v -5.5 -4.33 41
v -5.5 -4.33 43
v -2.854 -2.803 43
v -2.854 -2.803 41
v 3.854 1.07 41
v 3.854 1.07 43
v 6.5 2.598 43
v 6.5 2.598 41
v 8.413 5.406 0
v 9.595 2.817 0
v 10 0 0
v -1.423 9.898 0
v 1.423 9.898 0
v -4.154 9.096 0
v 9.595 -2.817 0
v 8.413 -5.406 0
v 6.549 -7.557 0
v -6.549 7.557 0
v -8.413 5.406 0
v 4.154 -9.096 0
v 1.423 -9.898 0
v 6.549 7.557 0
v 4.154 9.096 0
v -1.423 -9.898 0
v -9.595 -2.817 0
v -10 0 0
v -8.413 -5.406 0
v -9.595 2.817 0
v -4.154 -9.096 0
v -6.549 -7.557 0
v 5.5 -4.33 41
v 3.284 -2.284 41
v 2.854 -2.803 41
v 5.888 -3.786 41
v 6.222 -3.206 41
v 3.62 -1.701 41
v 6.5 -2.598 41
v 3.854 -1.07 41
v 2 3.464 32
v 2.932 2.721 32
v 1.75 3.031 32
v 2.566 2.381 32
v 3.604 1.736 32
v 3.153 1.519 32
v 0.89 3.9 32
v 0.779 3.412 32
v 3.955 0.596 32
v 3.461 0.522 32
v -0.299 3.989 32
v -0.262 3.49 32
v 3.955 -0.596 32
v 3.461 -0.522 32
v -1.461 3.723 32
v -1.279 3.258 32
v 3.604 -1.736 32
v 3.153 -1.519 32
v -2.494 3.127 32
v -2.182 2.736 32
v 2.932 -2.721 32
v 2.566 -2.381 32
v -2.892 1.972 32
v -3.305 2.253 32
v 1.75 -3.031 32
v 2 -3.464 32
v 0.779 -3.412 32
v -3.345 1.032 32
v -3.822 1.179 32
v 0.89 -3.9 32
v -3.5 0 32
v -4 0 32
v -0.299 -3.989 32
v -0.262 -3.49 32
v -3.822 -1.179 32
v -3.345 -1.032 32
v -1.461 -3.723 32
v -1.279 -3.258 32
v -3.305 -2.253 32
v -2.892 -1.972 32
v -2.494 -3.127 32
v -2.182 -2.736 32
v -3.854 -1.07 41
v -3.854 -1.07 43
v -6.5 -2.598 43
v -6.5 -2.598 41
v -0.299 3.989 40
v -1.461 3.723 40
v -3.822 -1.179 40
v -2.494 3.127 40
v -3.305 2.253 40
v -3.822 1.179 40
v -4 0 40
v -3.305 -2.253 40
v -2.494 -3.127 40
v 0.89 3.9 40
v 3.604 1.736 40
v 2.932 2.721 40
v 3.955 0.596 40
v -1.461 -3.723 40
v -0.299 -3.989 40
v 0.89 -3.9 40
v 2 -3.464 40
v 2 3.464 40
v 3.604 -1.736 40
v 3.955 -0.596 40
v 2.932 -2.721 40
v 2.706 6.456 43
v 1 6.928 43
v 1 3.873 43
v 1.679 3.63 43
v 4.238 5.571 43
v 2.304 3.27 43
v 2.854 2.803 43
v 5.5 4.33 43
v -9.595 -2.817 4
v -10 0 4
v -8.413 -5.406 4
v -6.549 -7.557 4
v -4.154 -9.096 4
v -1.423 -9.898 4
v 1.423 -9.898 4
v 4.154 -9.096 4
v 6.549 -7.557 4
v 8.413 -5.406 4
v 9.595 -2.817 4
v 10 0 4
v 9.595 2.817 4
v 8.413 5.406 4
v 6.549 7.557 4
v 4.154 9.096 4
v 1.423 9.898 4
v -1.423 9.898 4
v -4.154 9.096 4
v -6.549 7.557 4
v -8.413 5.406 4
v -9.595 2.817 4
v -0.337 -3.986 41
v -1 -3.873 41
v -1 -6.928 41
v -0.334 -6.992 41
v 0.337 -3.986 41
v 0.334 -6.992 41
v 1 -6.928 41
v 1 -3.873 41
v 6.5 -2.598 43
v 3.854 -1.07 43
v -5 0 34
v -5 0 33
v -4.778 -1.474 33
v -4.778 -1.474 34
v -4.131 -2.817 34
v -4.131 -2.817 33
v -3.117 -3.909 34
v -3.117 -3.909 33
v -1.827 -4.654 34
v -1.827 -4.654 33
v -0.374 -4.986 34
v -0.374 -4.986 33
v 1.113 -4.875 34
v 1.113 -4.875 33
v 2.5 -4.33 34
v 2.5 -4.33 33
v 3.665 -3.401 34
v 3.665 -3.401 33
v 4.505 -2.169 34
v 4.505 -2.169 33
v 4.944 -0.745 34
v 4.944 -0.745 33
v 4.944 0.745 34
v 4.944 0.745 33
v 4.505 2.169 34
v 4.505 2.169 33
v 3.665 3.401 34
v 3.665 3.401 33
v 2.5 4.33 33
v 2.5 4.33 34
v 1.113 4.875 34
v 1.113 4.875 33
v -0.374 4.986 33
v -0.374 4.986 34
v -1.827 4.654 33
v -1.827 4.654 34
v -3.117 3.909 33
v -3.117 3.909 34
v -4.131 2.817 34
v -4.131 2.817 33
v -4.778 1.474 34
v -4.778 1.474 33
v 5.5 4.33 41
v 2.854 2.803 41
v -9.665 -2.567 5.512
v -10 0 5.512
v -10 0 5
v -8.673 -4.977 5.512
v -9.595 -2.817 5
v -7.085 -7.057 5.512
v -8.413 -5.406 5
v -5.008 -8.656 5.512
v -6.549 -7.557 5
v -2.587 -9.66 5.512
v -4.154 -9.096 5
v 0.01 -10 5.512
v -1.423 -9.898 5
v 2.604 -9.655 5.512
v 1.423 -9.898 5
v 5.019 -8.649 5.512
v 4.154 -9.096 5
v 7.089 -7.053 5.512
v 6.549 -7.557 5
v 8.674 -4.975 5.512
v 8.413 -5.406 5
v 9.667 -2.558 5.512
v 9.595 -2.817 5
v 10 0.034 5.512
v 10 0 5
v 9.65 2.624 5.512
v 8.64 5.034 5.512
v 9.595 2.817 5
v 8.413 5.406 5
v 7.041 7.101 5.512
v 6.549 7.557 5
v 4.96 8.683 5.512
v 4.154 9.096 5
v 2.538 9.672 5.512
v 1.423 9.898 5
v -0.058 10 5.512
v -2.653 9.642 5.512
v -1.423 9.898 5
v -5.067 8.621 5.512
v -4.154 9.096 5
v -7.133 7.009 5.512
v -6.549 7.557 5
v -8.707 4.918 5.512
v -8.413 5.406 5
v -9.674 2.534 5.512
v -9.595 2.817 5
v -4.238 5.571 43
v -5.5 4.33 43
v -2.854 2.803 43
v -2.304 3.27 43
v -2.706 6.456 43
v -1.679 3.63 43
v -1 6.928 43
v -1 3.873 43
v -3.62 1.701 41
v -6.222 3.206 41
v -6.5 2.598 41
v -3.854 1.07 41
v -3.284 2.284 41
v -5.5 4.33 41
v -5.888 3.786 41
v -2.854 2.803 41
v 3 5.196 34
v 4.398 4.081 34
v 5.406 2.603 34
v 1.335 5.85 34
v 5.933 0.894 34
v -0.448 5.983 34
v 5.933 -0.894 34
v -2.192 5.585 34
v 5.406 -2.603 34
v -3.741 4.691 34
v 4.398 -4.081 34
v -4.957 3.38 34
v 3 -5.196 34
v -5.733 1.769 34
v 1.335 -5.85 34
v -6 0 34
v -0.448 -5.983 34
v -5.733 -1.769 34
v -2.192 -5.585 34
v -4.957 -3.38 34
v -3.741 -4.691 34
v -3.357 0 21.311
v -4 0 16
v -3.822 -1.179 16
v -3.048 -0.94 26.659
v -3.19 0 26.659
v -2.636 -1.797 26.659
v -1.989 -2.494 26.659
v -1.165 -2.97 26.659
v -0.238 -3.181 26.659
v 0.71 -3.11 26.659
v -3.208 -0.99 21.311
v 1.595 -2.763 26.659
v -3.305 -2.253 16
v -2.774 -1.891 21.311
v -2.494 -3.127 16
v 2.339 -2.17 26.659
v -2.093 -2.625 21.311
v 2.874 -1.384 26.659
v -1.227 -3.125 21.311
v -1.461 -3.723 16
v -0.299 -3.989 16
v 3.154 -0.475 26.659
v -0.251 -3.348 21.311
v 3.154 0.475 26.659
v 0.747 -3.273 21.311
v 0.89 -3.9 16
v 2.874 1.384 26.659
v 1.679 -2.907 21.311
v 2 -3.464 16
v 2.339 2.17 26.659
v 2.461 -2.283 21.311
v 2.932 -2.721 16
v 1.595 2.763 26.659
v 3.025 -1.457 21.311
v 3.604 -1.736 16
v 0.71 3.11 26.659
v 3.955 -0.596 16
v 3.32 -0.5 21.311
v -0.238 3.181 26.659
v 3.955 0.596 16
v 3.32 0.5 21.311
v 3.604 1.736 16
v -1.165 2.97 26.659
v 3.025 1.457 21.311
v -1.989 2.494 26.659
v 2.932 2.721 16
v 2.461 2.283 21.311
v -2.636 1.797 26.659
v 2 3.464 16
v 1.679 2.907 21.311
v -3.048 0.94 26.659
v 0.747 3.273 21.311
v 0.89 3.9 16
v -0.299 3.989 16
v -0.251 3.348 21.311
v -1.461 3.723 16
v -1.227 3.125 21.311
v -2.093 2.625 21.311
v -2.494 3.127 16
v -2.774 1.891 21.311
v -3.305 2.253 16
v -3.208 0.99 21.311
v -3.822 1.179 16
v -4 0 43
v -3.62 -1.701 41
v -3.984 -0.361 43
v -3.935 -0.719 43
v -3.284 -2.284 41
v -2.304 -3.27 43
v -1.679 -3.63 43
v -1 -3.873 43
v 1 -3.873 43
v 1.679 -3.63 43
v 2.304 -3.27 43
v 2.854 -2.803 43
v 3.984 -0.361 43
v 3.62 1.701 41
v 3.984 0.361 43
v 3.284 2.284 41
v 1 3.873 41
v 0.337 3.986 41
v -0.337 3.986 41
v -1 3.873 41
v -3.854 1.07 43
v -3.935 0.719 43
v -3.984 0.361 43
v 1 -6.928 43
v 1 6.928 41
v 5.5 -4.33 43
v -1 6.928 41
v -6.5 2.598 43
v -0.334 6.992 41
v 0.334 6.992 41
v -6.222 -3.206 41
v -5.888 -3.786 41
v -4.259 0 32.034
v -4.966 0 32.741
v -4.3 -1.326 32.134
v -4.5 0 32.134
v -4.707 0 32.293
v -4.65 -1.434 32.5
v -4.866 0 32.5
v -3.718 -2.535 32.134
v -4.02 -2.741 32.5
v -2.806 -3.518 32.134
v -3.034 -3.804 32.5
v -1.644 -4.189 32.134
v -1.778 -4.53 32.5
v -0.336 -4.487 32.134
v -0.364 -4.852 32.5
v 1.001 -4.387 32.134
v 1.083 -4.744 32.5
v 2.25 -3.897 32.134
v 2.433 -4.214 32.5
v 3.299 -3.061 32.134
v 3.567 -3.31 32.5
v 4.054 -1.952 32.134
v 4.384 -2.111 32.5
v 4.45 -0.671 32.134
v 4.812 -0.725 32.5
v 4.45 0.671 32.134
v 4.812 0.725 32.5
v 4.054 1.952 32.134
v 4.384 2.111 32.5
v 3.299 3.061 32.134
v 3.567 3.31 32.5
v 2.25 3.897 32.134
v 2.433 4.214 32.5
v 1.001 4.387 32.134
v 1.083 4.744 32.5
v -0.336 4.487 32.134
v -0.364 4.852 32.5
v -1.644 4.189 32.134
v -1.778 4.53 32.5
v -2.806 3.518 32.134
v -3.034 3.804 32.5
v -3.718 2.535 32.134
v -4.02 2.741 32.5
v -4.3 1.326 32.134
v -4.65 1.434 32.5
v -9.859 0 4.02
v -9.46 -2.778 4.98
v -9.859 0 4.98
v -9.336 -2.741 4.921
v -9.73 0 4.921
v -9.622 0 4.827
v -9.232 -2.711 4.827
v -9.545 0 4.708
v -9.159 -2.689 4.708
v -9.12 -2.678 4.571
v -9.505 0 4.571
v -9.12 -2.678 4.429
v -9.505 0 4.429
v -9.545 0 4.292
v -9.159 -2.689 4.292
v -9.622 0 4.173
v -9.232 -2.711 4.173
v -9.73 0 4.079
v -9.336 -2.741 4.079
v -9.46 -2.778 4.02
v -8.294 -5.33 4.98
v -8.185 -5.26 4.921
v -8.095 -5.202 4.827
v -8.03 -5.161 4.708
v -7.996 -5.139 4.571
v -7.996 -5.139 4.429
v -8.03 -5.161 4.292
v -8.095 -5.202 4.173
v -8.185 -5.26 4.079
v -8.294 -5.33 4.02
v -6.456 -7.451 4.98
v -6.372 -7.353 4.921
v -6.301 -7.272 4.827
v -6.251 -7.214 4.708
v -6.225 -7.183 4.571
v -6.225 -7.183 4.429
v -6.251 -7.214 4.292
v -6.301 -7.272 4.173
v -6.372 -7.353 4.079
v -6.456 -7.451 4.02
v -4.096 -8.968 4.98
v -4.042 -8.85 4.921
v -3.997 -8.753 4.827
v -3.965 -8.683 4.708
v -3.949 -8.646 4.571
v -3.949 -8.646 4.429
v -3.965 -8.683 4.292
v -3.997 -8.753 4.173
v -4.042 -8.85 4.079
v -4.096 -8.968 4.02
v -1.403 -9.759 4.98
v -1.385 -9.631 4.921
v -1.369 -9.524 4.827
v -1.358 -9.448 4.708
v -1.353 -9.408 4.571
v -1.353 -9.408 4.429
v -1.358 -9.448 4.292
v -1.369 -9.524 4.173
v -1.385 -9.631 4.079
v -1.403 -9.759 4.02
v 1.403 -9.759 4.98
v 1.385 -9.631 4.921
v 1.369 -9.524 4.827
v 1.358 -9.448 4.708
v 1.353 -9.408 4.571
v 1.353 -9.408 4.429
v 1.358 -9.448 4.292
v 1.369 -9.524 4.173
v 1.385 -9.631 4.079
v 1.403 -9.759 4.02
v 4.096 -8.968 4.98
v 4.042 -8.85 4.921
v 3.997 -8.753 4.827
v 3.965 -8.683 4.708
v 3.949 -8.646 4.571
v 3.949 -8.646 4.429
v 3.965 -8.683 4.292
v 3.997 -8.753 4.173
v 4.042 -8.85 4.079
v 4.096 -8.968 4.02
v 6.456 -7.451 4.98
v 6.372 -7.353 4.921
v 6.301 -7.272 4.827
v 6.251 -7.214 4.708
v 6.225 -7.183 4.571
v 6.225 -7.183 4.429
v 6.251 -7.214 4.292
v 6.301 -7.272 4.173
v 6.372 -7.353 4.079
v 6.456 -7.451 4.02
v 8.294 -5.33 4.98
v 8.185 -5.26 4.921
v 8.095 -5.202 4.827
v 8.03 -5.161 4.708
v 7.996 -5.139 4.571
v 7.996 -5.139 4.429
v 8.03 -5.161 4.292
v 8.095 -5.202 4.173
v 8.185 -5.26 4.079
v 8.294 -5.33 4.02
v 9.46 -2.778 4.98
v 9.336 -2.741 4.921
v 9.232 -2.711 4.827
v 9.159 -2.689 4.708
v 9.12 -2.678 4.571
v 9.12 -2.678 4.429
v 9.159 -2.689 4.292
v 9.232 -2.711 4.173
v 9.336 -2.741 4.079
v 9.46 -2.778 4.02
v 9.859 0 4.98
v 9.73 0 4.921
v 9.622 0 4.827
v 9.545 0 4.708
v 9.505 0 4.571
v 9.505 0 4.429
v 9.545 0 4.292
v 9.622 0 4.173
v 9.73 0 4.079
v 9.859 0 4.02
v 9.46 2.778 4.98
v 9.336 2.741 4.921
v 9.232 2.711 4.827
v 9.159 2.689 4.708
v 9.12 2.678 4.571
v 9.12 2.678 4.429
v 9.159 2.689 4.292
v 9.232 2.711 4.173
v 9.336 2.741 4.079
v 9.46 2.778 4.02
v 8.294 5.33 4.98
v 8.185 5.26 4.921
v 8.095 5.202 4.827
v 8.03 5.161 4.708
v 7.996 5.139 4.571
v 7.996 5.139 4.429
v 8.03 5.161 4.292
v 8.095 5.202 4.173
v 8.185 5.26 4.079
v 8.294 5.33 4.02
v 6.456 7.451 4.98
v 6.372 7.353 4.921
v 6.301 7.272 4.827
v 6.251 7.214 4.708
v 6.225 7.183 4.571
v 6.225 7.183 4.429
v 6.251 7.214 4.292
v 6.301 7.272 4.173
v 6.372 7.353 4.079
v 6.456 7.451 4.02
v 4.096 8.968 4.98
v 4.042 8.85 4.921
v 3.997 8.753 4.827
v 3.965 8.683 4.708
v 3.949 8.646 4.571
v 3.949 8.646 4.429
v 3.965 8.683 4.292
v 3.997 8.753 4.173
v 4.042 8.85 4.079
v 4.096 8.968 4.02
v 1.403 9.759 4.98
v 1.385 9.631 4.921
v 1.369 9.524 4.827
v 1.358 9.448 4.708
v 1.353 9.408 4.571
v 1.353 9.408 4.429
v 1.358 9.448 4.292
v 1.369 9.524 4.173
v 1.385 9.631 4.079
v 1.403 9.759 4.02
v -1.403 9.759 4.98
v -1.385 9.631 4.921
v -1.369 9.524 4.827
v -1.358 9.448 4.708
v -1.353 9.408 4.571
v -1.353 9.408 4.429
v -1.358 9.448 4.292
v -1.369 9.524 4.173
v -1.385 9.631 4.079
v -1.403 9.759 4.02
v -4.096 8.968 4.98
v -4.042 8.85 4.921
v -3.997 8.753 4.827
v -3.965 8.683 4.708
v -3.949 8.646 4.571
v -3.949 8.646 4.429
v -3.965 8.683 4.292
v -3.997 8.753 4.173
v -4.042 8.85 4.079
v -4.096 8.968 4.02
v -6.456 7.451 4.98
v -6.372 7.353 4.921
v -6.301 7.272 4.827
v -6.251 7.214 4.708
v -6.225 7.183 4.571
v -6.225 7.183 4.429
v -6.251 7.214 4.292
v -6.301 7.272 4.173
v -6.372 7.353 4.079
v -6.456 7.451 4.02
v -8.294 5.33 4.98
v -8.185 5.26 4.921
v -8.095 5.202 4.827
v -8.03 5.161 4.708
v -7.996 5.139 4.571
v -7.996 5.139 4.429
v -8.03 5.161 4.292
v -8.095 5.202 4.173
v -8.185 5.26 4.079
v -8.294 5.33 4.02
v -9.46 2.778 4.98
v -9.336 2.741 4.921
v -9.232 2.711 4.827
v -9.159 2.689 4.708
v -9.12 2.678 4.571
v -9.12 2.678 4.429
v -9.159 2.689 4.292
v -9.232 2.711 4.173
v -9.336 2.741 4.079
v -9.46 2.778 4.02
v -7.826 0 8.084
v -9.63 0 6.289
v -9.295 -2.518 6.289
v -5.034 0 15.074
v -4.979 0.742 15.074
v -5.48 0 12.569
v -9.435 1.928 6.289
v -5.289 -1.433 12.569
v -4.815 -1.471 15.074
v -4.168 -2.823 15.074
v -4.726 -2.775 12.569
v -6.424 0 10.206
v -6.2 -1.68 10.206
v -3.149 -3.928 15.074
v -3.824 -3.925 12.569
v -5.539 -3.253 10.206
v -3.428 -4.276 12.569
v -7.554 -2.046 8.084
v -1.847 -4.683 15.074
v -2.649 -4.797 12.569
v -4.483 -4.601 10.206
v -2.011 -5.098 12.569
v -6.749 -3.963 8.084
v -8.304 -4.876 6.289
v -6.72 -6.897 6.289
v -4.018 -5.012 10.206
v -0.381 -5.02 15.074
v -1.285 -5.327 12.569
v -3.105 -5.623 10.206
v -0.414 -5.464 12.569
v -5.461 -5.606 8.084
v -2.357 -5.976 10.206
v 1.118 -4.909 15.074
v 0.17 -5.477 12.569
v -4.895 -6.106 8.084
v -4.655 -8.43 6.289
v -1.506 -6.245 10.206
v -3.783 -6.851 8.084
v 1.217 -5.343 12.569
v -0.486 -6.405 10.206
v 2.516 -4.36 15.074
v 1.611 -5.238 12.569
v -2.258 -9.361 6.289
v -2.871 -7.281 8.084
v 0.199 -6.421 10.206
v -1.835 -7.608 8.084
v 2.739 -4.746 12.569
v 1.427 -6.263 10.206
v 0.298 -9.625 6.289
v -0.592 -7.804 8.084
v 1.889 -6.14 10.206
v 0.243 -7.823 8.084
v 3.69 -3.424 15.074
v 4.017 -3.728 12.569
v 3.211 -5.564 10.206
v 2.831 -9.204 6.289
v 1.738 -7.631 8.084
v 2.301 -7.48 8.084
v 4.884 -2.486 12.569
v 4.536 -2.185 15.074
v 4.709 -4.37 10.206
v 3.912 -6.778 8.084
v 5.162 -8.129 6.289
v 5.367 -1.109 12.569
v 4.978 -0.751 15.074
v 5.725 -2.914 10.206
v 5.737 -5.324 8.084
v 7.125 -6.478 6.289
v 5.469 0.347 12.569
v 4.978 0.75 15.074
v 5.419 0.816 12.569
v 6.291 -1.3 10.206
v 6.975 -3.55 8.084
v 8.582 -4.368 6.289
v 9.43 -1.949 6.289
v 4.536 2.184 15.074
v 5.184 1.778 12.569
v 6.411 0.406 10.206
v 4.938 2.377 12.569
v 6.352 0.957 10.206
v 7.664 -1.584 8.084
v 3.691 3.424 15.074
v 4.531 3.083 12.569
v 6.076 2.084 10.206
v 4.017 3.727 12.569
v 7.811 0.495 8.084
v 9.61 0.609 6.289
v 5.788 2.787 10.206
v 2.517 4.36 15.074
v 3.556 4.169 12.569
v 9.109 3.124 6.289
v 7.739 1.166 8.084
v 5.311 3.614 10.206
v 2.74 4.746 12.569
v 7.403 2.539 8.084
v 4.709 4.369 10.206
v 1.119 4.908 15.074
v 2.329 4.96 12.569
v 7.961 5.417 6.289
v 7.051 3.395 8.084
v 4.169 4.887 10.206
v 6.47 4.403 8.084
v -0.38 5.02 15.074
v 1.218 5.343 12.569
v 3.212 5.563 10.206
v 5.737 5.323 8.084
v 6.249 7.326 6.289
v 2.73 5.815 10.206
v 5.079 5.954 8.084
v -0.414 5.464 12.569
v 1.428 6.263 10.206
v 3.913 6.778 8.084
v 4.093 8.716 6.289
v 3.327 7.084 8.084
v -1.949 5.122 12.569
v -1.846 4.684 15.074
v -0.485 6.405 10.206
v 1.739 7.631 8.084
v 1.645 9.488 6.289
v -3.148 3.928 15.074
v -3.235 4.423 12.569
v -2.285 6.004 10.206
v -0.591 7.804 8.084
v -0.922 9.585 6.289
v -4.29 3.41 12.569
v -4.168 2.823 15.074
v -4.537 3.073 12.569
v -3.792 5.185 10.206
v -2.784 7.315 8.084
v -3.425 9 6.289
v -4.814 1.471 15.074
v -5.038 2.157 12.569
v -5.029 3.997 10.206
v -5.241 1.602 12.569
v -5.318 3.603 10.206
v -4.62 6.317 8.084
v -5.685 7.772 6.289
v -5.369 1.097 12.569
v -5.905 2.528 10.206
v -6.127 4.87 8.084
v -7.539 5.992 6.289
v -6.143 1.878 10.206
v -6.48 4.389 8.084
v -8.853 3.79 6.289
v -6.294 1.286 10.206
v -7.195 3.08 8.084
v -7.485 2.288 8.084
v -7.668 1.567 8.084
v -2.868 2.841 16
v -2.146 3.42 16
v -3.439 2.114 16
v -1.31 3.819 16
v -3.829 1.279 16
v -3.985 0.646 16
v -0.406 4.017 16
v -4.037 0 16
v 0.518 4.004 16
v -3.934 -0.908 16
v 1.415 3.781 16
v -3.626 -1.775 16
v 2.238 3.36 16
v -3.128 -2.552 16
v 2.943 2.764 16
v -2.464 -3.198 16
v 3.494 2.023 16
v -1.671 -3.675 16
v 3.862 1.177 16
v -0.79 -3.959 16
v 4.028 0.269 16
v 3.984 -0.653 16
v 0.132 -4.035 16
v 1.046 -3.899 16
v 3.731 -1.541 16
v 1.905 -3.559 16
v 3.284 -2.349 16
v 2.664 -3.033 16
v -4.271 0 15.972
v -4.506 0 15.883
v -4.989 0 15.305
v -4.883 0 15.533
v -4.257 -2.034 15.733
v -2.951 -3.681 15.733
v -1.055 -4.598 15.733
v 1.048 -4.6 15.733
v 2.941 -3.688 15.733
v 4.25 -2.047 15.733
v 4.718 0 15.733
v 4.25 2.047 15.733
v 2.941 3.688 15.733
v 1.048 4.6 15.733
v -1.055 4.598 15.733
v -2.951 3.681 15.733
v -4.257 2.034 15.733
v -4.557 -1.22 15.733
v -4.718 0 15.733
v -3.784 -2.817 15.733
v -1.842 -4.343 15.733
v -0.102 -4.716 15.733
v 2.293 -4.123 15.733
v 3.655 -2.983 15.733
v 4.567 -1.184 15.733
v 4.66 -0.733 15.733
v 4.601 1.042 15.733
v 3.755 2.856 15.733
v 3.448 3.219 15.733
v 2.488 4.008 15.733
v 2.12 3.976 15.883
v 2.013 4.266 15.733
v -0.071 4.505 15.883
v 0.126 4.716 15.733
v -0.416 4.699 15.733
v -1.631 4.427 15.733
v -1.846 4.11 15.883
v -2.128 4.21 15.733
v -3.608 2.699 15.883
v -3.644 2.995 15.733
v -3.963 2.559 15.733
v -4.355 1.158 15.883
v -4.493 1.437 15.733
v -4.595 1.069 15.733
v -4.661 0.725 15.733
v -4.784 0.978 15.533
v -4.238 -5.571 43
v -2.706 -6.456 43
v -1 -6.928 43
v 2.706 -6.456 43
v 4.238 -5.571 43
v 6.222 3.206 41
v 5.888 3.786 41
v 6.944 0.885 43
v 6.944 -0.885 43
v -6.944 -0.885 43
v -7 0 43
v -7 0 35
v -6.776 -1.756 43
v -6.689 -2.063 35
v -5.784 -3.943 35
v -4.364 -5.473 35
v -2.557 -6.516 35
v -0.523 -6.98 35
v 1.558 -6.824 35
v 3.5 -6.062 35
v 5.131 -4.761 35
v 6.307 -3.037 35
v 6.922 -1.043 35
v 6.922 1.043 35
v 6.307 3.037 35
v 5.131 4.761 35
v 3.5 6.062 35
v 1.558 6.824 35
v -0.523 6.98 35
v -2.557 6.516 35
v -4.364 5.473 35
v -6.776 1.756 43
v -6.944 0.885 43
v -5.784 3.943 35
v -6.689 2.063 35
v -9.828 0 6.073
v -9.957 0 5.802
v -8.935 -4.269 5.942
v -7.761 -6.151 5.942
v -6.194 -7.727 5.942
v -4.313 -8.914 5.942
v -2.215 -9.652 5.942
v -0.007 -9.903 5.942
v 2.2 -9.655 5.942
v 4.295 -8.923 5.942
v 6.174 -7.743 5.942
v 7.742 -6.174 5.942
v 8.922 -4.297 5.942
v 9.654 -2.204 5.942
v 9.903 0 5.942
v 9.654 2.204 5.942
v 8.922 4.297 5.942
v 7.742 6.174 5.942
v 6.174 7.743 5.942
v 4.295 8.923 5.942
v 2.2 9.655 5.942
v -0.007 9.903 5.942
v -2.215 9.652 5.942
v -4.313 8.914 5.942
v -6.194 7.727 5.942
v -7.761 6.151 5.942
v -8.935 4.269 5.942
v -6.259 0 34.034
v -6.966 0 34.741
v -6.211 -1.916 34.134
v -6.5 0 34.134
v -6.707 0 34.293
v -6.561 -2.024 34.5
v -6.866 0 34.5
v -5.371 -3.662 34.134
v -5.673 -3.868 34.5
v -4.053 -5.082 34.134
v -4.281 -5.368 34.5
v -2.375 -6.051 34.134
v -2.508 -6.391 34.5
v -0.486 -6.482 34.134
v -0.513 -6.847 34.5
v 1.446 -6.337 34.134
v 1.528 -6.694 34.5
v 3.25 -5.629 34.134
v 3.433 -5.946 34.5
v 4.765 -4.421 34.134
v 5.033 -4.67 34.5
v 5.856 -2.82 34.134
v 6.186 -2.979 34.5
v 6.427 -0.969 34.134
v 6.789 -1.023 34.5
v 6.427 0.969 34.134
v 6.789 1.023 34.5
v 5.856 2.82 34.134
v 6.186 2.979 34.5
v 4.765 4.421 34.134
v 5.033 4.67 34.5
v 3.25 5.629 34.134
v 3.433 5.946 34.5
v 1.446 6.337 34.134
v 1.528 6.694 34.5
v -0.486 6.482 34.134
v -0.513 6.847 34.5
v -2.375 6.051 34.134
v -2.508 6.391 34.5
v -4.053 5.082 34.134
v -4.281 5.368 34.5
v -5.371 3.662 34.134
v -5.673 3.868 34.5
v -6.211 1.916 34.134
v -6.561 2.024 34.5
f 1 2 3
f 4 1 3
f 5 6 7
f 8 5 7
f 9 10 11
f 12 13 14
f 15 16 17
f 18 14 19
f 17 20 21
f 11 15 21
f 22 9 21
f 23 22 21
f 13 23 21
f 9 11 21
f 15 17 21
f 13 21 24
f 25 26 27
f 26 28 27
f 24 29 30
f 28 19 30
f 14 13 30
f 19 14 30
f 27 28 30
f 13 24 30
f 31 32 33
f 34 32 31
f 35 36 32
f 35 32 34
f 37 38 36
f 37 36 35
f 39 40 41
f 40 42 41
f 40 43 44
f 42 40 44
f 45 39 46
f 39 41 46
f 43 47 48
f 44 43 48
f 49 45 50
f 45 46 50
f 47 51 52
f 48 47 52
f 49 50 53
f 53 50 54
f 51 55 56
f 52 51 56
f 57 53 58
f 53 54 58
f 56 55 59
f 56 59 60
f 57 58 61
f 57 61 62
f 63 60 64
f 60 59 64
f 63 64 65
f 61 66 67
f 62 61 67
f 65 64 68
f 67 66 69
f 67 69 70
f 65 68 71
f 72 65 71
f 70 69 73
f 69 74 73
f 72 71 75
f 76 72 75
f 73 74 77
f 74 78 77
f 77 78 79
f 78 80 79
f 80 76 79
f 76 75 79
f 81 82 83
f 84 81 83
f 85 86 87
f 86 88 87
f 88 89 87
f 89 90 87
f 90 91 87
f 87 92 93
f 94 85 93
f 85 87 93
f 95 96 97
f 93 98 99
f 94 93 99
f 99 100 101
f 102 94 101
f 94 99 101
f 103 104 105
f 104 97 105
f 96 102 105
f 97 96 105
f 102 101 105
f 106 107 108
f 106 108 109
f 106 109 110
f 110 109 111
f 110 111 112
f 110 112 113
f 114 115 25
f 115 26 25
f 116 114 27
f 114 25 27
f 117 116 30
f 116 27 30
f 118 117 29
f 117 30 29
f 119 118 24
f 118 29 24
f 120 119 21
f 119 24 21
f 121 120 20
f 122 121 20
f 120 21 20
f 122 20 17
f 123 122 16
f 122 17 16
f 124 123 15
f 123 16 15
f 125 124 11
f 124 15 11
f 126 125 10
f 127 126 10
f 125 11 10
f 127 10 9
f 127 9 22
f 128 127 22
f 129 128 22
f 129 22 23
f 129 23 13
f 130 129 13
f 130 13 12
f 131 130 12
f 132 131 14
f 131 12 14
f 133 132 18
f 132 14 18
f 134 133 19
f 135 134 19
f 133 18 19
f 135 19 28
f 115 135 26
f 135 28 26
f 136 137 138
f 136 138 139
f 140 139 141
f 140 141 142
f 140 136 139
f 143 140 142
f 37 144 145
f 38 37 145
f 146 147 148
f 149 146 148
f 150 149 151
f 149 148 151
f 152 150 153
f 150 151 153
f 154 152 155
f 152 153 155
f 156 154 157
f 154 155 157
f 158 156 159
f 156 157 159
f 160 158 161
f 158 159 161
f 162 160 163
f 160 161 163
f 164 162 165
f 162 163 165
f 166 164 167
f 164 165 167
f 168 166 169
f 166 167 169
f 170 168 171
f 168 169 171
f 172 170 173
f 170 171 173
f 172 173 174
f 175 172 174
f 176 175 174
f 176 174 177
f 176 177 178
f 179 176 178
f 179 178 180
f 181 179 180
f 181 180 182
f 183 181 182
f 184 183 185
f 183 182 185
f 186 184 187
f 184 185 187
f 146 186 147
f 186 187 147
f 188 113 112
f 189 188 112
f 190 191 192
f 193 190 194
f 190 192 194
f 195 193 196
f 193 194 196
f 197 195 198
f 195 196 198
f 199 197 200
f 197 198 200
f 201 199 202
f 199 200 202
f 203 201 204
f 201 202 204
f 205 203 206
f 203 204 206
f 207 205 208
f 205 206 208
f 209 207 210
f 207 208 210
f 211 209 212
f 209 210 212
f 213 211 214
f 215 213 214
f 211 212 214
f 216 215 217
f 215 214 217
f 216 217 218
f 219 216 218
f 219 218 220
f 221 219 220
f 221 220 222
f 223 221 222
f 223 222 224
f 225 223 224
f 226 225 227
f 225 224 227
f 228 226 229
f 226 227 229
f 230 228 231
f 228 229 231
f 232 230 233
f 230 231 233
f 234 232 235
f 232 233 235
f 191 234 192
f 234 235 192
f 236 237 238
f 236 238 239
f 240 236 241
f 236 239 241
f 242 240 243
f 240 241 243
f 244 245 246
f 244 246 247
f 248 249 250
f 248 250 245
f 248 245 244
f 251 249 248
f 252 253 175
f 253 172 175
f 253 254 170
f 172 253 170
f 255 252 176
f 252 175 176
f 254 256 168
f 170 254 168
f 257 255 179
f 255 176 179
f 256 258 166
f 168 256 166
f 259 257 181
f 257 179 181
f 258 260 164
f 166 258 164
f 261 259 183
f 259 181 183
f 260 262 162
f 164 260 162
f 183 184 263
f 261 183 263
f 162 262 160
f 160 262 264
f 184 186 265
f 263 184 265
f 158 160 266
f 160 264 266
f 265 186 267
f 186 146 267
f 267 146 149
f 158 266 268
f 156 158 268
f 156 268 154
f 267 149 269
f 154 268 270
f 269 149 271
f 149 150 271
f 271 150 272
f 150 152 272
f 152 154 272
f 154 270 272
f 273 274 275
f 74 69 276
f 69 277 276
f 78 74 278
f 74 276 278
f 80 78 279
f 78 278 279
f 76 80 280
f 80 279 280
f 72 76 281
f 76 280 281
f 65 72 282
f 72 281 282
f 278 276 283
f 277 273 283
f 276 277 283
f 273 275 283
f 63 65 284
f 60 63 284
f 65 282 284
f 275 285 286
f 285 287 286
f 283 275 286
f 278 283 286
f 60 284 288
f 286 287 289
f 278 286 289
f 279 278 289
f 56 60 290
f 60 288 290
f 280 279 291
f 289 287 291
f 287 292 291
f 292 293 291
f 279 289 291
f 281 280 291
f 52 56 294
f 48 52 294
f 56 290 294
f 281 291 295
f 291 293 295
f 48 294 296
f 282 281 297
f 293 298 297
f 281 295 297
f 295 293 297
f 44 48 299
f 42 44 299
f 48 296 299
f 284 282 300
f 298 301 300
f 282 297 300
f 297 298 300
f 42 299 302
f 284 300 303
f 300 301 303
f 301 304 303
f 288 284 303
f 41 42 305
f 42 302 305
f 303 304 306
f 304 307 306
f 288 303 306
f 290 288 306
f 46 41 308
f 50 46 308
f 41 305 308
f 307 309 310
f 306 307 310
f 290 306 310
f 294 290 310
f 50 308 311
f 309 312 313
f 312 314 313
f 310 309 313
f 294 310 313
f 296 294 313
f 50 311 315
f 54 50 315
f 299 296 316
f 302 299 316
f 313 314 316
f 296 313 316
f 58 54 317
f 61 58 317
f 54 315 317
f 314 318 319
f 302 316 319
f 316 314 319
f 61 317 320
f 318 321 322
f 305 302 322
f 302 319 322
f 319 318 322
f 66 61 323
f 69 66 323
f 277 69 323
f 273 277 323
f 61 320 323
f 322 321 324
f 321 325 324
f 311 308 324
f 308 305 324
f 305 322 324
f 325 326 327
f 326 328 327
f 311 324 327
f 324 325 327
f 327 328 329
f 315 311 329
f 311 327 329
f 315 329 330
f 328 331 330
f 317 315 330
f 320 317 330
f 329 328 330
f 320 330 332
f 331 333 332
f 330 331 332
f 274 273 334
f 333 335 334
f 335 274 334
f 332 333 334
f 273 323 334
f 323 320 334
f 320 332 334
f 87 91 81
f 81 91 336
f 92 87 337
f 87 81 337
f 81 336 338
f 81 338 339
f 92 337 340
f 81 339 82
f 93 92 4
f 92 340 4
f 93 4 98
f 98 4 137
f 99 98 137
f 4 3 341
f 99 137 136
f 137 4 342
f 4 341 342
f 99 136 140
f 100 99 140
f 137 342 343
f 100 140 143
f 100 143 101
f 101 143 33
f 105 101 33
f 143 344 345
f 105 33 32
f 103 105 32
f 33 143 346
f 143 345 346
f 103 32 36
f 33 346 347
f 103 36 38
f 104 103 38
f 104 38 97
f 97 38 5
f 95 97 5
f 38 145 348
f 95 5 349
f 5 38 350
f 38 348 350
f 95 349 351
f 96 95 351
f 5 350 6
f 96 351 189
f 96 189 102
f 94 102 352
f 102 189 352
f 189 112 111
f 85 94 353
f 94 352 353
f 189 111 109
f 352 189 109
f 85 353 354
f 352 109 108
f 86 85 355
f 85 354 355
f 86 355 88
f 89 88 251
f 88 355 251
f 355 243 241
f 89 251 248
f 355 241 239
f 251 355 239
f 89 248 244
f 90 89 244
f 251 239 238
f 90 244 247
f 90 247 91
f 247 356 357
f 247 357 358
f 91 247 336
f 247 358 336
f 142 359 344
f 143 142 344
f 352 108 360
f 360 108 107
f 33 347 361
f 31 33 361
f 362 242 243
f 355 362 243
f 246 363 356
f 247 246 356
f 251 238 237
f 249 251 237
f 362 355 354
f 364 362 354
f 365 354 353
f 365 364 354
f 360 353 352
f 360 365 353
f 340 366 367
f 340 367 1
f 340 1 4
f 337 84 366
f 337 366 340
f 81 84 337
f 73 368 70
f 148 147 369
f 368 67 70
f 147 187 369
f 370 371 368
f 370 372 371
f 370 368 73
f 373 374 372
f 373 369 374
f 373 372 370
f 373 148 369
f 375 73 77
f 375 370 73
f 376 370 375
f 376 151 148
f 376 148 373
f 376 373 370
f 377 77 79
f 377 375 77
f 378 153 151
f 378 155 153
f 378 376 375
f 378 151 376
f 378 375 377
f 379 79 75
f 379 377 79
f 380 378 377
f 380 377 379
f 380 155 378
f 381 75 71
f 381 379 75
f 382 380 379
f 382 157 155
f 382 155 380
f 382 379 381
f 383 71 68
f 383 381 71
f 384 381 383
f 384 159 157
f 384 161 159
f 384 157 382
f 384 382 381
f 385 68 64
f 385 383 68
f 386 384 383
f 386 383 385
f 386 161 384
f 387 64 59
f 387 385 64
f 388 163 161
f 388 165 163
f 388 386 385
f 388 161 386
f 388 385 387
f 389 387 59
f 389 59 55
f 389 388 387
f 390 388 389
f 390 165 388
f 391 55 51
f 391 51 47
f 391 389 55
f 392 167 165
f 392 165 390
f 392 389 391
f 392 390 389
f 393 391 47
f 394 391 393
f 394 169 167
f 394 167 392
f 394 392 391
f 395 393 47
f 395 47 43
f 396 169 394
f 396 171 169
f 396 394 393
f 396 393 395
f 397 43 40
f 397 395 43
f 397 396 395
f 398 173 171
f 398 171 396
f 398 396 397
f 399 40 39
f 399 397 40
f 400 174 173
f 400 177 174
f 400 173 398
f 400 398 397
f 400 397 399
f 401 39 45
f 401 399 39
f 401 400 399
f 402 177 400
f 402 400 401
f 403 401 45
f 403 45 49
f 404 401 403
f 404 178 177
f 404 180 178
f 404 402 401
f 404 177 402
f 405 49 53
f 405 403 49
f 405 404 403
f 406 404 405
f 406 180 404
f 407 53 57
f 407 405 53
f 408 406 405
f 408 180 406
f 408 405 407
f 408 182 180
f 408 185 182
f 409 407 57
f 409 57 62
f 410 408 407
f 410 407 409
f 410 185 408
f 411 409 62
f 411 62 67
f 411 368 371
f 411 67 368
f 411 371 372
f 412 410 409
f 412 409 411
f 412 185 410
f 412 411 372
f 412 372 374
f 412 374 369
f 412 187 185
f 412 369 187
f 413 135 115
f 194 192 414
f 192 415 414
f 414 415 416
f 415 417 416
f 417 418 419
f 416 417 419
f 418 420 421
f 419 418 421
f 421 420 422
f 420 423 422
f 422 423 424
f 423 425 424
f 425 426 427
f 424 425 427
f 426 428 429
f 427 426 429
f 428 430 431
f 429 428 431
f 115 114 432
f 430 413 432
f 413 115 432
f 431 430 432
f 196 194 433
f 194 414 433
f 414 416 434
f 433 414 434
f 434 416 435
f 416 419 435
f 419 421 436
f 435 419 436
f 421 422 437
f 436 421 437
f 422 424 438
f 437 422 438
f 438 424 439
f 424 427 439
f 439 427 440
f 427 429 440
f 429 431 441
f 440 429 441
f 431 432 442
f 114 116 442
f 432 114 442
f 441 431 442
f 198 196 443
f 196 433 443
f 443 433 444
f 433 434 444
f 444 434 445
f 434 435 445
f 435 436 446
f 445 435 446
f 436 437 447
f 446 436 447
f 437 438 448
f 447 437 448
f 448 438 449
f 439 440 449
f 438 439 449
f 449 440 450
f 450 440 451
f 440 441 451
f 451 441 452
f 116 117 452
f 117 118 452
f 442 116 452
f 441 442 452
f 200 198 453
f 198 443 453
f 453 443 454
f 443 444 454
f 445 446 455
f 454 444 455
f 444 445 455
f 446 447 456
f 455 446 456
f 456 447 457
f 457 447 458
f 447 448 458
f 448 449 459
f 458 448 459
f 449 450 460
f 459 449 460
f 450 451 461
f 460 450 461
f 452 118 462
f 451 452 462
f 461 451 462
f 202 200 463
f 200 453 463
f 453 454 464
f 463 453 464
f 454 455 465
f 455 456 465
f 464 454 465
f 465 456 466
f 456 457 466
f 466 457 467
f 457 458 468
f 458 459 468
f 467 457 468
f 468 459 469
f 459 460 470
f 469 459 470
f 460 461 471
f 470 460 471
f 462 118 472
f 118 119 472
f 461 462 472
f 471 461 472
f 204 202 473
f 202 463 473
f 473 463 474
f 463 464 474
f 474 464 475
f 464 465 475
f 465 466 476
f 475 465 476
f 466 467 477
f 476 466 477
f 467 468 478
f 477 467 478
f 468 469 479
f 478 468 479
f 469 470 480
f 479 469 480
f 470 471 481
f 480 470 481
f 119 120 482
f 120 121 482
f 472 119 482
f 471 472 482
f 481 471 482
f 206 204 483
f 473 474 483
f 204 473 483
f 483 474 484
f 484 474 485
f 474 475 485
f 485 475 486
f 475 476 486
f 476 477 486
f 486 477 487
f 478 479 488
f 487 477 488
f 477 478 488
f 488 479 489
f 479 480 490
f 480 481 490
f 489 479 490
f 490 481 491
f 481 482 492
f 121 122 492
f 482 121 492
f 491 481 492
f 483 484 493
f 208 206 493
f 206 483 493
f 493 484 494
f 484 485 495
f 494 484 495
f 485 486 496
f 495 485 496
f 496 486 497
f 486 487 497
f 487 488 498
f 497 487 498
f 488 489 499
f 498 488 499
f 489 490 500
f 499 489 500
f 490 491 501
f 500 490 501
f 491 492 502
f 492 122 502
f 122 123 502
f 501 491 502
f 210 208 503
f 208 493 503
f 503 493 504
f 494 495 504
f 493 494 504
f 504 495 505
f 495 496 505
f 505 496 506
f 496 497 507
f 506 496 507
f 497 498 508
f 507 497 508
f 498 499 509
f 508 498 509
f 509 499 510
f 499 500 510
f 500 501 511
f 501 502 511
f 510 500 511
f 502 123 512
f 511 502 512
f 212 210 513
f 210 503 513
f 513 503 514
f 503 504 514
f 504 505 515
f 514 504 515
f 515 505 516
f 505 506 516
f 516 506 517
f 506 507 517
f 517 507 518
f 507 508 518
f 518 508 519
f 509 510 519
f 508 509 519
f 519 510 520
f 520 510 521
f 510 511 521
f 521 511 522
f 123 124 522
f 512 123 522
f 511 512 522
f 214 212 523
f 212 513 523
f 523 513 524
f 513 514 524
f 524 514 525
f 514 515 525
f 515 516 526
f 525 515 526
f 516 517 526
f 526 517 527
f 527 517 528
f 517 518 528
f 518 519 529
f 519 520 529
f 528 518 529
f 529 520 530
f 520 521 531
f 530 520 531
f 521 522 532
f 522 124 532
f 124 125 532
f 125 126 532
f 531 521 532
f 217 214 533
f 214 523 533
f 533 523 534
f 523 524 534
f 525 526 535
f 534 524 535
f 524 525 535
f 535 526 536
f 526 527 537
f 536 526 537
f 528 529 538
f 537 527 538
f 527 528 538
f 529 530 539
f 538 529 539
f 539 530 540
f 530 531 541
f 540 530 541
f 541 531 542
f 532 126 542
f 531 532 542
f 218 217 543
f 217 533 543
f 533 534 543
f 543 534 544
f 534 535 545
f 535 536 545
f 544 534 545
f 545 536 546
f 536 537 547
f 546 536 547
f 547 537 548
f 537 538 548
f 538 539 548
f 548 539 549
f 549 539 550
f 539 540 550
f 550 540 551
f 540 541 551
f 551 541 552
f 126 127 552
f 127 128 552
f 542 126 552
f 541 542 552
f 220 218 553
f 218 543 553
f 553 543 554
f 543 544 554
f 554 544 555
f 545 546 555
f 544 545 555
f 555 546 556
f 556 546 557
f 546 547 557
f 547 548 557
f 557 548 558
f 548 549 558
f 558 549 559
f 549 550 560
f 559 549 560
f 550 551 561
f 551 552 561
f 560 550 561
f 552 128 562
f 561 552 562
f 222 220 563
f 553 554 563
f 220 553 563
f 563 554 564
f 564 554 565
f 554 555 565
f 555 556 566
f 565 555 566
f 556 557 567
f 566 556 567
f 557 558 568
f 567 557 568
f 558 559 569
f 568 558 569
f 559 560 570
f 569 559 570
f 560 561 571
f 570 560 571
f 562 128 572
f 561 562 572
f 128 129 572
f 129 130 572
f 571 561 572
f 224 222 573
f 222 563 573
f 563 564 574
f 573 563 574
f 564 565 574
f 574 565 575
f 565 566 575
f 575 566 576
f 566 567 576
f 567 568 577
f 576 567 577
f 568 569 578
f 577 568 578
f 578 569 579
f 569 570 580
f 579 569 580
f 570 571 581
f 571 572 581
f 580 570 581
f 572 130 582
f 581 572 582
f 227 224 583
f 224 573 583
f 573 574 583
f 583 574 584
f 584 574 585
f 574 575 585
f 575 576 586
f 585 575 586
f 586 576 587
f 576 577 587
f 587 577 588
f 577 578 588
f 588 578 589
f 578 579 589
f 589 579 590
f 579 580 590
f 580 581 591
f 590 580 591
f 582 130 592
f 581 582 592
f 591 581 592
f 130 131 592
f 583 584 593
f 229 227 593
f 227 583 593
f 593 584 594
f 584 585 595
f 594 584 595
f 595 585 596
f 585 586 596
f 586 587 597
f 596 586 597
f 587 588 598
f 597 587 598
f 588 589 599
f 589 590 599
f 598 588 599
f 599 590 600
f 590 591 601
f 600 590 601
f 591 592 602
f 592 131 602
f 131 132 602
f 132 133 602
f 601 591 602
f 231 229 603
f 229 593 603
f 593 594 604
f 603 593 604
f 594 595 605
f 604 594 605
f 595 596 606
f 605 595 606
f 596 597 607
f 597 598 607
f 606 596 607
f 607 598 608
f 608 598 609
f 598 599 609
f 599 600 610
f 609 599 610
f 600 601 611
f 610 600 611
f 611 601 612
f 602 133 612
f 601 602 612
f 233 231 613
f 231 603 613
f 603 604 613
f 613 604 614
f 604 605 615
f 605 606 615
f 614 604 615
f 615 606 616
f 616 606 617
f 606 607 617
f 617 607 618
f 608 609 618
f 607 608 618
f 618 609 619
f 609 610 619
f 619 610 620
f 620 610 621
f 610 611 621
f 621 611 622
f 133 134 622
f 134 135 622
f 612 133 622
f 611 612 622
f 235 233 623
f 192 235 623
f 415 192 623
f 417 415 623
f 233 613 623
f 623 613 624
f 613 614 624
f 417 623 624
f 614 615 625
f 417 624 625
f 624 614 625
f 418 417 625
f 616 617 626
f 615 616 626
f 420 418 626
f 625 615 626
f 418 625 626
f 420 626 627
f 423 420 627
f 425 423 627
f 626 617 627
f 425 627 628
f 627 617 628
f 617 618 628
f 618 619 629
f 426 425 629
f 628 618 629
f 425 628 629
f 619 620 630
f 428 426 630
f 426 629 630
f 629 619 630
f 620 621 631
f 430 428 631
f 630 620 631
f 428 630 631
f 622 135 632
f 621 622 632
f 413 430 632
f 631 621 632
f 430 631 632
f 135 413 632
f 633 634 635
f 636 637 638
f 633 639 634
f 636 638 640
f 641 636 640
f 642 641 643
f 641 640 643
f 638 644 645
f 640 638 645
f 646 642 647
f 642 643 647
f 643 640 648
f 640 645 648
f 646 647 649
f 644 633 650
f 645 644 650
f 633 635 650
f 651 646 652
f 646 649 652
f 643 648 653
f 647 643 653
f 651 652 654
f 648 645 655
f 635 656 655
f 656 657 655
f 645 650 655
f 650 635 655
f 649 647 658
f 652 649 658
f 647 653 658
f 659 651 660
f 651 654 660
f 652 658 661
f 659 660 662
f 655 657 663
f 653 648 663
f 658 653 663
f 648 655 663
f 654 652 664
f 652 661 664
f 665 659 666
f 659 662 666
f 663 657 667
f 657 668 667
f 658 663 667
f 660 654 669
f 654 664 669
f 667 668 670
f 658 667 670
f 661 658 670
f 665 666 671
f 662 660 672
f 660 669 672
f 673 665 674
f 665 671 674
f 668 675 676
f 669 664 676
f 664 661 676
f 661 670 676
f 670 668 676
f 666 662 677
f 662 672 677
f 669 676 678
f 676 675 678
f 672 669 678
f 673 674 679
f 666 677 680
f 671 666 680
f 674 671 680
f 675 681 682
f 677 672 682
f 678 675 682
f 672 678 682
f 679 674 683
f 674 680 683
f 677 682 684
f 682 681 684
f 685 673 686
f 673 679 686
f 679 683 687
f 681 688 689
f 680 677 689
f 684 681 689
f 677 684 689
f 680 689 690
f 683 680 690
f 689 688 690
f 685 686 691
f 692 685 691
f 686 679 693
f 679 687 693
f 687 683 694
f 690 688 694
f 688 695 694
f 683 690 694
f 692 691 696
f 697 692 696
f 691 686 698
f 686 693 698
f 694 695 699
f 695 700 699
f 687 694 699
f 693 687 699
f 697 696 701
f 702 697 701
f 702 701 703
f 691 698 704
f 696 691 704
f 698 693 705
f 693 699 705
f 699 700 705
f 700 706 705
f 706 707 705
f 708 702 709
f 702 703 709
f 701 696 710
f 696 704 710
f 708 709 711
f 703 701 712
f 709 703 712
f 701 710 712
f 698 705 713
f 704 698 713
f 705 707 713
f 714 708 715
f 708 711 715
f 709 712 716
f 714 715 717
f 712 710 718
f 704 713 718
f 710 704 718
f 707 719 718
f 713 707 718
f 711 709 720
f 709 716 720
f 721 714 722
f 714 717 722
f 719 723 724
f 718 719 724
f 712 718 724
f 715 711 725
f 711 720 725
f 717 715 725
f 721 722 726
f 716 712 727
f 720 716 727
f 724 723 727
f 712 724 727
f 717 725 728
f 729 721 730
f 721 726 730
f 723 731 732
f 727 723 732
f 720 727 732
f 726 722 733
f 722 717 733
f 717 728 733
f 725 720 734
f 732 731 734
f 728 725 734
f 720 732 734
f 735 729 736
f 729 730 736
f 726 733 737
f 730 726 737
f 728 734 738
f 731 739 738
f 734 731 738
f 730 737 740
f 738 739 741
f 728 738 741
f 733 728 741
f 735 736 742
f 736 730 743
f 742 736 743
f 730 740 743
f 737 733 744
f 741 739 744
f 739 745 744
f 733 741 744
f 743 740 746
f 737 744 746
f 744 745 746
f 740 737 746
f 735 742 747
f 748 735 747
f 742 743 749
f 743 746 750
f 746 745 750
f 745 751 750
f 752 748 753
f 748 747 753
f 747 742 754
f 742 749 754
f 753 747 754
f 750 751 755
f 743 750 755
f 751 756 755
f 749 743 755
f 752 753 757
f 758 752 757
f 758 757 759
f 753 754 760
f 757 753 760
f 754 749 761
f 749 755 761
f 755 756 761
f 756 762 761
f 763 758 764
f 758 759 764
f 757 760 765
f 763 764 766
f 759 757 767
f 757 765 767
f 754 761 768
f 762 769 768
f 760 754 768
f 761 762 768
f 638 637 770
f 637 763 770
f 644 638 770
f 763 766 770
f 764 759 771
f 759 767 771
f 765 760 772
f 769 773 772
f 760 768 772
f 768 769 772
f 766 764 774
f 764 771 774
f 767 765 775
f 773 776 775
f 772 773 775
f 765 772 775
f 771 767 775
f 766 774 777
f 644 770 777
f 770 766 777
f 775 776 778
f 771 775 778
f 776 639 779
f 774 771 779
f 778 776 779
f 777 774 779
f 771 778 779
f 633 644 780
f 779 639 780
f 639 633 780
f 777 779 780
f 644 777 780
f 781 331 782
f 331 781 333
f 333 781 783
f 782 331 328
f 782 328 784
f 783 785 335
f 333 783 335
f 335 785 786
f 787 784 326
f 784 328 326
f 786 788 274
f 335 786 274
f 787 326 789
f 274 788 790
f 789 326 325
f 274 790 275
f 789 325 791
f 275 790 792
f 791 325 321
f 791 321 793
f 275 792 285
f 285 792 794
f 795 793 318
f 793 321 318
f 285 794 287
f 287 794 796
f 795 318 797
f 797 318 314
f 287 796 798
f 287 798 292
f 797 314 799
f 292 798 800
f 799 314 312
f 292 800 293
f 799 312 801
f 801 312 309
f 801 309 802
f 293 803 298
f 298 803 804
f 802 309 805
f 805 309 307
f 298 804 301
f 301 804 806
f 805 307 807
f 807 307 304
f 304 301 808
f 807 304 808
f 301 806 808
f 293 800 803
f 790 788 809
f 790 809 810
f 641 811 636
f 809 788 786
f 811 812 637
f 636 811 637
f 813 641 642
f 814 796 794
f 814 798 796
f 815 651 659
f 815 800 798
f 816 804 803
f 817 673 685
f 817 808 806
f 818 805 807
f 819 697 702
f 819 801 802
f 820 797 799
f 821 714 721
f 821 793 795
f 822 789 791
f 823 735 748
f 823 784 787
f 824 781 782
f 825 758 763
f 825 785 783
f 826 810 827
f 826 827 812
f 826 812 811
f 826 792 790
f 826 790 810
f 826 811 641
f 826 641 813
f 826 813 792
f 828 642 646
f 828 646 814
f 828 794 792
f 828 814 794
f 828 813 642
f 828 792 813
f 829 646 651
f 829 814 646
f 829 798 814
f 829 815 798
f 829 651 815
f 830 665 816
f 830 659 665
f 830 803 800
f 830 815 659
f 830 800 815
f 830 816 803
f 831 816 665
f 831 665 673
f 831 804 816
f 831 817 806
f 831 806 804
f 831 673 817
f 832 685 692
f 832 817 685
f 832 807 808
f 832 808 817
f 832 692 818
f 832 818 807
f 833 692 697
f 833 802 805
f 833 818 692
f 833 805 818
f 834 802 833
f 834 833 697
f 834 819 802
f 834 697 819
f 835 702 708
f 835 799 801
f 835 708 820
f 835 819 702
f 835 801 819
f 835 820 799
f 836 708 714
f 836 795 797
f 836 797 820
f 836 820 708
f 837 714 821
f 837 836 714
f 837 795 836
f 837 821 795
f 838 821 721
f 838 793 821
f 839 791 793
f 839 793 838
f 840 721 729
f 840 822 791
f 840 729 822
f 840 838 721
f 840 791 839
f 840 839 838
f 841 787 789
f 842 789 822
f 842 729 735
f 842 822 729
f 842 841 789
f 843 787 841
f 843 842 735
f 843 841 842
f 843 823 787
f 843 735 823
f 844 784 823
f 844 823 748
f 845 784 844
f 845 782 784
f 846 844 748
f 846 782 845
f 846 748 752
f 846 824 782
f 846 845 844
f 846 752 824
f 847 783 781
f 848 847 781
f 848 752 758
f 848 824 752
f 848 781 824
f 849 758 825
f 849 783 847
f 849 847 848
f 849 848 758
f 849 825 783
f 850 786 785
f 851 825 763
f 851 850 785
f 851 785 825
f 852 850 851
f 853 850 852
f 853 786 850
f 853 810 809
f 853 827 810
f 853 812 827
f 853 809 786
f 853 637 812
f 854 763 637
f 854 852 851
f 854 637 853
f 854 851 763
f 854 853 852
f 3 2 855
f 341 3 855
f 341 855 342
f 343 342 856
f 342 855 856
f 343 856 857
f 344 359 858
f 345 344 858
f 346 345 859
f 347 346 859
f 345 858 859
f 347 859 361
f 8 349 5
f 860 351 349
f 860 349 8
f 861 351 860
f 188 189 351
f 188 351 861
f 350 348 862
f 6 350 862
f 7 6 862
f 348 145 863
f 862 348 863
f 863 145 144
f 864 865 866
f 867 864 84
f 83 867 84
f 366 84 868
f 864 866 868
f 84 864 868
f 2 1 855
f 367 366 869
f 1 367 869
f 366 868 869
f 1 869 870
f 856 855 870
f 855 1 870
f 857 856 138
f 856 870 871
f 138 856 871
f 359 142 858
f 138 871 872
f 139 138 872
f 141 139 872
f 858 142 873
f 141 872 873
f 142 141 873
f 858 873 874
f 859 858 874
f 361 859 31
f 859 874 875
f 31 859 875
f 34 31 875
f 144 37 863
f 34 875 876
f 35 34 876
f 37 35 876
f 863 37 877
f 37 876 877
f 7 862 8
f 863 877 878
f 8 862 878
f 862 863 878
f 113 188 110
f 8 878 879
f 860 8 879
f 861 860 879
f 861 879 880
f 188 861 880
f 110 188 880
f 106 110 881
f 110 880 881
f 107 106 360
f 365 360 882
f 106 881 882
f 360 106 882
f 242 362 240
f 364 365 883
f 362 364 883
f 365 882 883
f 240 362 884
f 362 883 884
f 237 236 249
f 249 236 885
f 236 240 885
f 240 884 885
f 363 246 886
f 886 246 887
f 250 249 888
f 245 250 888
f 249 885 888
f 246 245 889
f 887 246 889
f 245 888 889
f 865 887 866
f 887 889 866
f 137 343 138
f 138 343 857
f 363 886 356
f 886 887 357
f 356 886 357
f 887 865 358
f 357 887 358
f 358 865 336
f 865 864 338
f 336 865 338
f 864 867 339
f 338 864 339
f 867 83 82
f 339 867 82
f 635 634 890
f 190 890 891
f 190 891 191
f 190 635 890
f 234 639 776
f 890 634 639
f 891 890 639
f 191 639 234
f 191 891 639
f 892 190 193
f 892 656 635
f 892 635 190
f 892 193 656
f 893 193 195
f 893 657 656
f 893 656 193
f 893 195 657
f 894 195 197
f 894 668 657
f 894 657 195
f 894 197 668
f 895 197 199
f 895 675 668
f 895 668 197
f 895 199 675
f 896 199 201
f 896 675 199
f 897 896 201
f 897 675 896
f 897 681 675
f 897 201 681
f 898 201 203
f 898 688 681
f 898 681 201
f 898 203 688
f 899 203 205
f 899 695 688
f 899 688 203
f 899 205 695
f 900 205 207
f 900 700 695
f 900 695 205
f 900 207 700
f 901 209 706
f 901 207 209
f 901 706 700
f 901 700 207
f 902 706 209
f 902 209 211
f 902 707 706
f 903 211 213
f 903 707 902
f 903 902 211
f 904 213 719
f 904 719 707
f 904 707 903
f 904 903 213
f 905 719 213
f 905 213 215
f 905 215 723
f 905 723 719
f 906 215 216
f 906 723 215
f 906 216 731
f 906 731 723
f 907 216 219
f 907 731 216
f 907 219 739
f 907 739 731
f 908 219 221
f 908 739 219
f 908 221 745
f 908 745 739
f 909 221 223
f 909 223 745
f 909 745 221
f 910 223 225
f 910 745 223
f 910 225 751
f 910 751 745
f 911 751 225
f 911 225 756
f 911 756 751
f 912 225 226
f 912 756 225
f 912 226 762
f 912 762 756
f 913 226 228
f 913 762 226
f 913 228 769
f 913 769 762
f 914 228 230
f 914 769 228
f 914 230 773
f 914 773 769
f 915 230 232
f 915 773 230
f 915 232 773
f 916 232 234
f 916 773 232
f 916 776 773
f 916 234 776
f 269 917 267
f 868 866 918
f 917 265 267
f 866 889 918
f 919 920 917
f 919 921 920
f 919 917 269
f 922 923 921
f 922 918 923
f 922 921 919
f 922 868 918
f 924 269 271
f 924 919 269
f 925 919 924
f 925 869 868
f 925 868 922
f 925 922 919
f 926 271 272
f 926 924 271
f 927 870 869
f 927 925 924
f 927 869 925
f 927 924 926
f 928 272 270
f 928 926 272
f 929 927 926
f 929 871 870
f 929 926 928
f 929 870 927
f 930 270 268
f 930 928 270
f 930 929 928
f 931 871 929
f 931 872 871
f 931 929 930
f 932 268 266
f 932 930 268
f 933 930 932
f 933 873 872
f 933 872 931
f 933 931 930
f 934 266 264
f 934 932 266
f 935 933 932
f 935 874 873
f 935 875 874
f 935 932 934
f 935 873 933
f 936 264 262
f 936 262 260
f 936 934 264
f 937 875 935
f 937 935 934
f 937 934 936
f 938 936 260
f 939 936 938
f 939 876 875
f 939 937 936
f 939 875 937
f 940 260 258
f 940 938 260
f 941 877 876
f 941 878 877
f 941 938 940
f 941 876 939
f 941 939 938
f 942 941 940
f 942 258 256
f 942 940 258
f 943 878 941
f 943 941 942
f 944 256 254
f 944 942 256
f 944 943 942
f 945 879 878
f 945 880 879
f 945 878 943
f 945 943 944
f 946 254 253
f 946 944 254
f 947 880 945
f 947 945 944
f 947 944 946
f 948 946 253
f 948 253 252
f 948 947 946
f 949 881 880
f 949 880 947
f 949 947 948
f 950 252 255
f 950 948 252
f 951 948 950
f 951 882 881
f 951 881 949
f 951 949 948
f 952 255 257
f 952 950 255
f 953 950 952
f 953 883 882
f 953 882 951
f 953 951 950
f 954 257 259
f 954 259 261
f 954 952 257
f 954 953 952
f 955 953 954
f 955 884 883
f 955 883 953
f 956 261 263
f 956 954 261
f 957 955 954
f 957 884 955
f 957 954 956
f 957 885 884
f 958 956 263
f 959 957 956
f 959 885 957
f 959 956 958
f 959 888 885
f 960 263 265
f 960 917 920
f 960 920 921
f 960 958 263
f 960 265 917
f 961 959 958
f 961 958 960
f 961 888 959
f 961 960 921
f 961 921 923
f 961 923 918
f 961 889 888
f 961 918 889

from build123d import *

# Parameters (mm, degrees)
F2_R     = 1
F3_R     = 1
F5_DEPTH = 2
F6_DEPTH = 2


with BuildPart() as f1:
    # F0 (on Front) → F1 (revolve)
    with BuildSketch(Plane.XZ):
        with BuildLine():
            Line((-10, 0), (0, 0))
            Line((0, 0), (0, 40))
            Line((0, 40), (-4, 40))
            Line((-4, 40), (-4, 43))
            Line((-4, 43), (-7, 43))
            Line((-7, 43), (-7, 34))
            Line((-7, 34), (-5, 34))
            Line((-5, 34), (-5, 32))
            Line((-5, 32), (-3.5, 32))
            ThreePointArc((-3.5, 32), (-3.214011, 23.98325), (-4, 16))
            Line((-4, 16), (-5, 16))
            ThreePointArc((-5, 16), (-6.31966, 10.40983), (-10, 6))
            Line((-10, 6), (-10, 5))
            ThreePointArc((-10, 5), (-9.5, 4.5), (-10, 4))
            Line((-10, 4), (-10, 0))
        make_face()
    revolve(axis=Axis((0, 0, 27.062729), (0, 0, 1)))

    # F2
    f2_edges = [f1.edges().sort_by_distance(p)[0] for p in [
        (10, 0, 6),
        (5, 0, 16),
    ]]
    fillet(f2_edges, radius=F2_R)

    # F3
    f3_edges = [f1.edges().sort_by_distance(p)[0] for p in [
        (7, 0, 34),
        (5, 0, 32),
    ]]
    fillet(f3_edges, radius=F3_R)

    # F4 (on face) → F5 (cut)
    with BuildSketch(Plane.XY.offset(43)):
        with BuildLine():
            ThreePointArc((1, 6.928203), (0, 7), (-1, 6.928203))
            Line((-1, 6.928203), (-1, 3.872983))
            ThreePointArc((-1, 3.872983), (0, 4), (1, 3.872983))
            Line((1, 3.872983), (1, 6.928203))
        make_face()
    extrude(amount=-F5_DEPTH, mode=Mode.SUBTRACT)

    # F4 (on face) → F6 (cut)
    with BuildSketch(Plane.XY.offset(43)):
        with BuildLine():
            Line((-2.854102, 2.802517), (-5.5, 4.330127))
            ThreePointArc((-5.5, 4.330127), (-6.062178, 3.5), (-6.5, 2.598076))
            Line((-6.5, 2.598076), (-3.854102, 1.070466))
            ThreePointArc((-3.854102, 1.070466), (-3.464102, 2), (-2.854102, 2.802517))
        make_face()
        with BuildLine():
            Line((-3.854102, -1.070466), (-6.5, -2.598076))
            ThreePointArc((-6.5, -2.598076), (-6.062178, -3.5), (-5.5, -4.330127))
            Line((-5.5, -4.330127), (-2.854102, -2.802517))
            ThreePointArc((-2.854102, -2.802517), (-3.464102, -2), (-3.854102, -1.070466))
        make_face()
        with BuildLine():
            Line((-1, -3.872983), (-1, -6.928203))
            ThreePointArc((-1, -6.928203), (0, -7), (1, -6.928203))
            Line((1, -6.928203), (1, -3.872983))
            ThreePointArc((1, -3.872983), (0, -4), (-1, -3.872983))
        make_face()
        with BuildLine():
            ThreePointArc((5.5, -4.330127), (6.062178, -3.5), (6.5, -2.598076))
            Line((6.5, -2.598076), (3.854102, -1.070466))
            ThreePointArc((3.854102, -1.070466), (3.464102, -2), (2.854102, -2.802517))
            Line((2.854102, -2.802517), (5.5, -4.330127))
        make_face()
        with BuildLine():
            ThreePointArc((6.5, 2.598076), (6.062178, 3.5), (5.5, 4.330127))
            Line((5.5, 4.330127), (2.854102, 2.802517))
            ThreePointArc((2.854102, 2.802517), (3.464102, 2), (3.854102, 1.070466))
            Line((3.854102, 1.070466), (6.5, 2.598076))
        make_face()
    extrude(amount=-F6_DEPTH, mode=Mode.SUBTRACT)


solid = f1.part
